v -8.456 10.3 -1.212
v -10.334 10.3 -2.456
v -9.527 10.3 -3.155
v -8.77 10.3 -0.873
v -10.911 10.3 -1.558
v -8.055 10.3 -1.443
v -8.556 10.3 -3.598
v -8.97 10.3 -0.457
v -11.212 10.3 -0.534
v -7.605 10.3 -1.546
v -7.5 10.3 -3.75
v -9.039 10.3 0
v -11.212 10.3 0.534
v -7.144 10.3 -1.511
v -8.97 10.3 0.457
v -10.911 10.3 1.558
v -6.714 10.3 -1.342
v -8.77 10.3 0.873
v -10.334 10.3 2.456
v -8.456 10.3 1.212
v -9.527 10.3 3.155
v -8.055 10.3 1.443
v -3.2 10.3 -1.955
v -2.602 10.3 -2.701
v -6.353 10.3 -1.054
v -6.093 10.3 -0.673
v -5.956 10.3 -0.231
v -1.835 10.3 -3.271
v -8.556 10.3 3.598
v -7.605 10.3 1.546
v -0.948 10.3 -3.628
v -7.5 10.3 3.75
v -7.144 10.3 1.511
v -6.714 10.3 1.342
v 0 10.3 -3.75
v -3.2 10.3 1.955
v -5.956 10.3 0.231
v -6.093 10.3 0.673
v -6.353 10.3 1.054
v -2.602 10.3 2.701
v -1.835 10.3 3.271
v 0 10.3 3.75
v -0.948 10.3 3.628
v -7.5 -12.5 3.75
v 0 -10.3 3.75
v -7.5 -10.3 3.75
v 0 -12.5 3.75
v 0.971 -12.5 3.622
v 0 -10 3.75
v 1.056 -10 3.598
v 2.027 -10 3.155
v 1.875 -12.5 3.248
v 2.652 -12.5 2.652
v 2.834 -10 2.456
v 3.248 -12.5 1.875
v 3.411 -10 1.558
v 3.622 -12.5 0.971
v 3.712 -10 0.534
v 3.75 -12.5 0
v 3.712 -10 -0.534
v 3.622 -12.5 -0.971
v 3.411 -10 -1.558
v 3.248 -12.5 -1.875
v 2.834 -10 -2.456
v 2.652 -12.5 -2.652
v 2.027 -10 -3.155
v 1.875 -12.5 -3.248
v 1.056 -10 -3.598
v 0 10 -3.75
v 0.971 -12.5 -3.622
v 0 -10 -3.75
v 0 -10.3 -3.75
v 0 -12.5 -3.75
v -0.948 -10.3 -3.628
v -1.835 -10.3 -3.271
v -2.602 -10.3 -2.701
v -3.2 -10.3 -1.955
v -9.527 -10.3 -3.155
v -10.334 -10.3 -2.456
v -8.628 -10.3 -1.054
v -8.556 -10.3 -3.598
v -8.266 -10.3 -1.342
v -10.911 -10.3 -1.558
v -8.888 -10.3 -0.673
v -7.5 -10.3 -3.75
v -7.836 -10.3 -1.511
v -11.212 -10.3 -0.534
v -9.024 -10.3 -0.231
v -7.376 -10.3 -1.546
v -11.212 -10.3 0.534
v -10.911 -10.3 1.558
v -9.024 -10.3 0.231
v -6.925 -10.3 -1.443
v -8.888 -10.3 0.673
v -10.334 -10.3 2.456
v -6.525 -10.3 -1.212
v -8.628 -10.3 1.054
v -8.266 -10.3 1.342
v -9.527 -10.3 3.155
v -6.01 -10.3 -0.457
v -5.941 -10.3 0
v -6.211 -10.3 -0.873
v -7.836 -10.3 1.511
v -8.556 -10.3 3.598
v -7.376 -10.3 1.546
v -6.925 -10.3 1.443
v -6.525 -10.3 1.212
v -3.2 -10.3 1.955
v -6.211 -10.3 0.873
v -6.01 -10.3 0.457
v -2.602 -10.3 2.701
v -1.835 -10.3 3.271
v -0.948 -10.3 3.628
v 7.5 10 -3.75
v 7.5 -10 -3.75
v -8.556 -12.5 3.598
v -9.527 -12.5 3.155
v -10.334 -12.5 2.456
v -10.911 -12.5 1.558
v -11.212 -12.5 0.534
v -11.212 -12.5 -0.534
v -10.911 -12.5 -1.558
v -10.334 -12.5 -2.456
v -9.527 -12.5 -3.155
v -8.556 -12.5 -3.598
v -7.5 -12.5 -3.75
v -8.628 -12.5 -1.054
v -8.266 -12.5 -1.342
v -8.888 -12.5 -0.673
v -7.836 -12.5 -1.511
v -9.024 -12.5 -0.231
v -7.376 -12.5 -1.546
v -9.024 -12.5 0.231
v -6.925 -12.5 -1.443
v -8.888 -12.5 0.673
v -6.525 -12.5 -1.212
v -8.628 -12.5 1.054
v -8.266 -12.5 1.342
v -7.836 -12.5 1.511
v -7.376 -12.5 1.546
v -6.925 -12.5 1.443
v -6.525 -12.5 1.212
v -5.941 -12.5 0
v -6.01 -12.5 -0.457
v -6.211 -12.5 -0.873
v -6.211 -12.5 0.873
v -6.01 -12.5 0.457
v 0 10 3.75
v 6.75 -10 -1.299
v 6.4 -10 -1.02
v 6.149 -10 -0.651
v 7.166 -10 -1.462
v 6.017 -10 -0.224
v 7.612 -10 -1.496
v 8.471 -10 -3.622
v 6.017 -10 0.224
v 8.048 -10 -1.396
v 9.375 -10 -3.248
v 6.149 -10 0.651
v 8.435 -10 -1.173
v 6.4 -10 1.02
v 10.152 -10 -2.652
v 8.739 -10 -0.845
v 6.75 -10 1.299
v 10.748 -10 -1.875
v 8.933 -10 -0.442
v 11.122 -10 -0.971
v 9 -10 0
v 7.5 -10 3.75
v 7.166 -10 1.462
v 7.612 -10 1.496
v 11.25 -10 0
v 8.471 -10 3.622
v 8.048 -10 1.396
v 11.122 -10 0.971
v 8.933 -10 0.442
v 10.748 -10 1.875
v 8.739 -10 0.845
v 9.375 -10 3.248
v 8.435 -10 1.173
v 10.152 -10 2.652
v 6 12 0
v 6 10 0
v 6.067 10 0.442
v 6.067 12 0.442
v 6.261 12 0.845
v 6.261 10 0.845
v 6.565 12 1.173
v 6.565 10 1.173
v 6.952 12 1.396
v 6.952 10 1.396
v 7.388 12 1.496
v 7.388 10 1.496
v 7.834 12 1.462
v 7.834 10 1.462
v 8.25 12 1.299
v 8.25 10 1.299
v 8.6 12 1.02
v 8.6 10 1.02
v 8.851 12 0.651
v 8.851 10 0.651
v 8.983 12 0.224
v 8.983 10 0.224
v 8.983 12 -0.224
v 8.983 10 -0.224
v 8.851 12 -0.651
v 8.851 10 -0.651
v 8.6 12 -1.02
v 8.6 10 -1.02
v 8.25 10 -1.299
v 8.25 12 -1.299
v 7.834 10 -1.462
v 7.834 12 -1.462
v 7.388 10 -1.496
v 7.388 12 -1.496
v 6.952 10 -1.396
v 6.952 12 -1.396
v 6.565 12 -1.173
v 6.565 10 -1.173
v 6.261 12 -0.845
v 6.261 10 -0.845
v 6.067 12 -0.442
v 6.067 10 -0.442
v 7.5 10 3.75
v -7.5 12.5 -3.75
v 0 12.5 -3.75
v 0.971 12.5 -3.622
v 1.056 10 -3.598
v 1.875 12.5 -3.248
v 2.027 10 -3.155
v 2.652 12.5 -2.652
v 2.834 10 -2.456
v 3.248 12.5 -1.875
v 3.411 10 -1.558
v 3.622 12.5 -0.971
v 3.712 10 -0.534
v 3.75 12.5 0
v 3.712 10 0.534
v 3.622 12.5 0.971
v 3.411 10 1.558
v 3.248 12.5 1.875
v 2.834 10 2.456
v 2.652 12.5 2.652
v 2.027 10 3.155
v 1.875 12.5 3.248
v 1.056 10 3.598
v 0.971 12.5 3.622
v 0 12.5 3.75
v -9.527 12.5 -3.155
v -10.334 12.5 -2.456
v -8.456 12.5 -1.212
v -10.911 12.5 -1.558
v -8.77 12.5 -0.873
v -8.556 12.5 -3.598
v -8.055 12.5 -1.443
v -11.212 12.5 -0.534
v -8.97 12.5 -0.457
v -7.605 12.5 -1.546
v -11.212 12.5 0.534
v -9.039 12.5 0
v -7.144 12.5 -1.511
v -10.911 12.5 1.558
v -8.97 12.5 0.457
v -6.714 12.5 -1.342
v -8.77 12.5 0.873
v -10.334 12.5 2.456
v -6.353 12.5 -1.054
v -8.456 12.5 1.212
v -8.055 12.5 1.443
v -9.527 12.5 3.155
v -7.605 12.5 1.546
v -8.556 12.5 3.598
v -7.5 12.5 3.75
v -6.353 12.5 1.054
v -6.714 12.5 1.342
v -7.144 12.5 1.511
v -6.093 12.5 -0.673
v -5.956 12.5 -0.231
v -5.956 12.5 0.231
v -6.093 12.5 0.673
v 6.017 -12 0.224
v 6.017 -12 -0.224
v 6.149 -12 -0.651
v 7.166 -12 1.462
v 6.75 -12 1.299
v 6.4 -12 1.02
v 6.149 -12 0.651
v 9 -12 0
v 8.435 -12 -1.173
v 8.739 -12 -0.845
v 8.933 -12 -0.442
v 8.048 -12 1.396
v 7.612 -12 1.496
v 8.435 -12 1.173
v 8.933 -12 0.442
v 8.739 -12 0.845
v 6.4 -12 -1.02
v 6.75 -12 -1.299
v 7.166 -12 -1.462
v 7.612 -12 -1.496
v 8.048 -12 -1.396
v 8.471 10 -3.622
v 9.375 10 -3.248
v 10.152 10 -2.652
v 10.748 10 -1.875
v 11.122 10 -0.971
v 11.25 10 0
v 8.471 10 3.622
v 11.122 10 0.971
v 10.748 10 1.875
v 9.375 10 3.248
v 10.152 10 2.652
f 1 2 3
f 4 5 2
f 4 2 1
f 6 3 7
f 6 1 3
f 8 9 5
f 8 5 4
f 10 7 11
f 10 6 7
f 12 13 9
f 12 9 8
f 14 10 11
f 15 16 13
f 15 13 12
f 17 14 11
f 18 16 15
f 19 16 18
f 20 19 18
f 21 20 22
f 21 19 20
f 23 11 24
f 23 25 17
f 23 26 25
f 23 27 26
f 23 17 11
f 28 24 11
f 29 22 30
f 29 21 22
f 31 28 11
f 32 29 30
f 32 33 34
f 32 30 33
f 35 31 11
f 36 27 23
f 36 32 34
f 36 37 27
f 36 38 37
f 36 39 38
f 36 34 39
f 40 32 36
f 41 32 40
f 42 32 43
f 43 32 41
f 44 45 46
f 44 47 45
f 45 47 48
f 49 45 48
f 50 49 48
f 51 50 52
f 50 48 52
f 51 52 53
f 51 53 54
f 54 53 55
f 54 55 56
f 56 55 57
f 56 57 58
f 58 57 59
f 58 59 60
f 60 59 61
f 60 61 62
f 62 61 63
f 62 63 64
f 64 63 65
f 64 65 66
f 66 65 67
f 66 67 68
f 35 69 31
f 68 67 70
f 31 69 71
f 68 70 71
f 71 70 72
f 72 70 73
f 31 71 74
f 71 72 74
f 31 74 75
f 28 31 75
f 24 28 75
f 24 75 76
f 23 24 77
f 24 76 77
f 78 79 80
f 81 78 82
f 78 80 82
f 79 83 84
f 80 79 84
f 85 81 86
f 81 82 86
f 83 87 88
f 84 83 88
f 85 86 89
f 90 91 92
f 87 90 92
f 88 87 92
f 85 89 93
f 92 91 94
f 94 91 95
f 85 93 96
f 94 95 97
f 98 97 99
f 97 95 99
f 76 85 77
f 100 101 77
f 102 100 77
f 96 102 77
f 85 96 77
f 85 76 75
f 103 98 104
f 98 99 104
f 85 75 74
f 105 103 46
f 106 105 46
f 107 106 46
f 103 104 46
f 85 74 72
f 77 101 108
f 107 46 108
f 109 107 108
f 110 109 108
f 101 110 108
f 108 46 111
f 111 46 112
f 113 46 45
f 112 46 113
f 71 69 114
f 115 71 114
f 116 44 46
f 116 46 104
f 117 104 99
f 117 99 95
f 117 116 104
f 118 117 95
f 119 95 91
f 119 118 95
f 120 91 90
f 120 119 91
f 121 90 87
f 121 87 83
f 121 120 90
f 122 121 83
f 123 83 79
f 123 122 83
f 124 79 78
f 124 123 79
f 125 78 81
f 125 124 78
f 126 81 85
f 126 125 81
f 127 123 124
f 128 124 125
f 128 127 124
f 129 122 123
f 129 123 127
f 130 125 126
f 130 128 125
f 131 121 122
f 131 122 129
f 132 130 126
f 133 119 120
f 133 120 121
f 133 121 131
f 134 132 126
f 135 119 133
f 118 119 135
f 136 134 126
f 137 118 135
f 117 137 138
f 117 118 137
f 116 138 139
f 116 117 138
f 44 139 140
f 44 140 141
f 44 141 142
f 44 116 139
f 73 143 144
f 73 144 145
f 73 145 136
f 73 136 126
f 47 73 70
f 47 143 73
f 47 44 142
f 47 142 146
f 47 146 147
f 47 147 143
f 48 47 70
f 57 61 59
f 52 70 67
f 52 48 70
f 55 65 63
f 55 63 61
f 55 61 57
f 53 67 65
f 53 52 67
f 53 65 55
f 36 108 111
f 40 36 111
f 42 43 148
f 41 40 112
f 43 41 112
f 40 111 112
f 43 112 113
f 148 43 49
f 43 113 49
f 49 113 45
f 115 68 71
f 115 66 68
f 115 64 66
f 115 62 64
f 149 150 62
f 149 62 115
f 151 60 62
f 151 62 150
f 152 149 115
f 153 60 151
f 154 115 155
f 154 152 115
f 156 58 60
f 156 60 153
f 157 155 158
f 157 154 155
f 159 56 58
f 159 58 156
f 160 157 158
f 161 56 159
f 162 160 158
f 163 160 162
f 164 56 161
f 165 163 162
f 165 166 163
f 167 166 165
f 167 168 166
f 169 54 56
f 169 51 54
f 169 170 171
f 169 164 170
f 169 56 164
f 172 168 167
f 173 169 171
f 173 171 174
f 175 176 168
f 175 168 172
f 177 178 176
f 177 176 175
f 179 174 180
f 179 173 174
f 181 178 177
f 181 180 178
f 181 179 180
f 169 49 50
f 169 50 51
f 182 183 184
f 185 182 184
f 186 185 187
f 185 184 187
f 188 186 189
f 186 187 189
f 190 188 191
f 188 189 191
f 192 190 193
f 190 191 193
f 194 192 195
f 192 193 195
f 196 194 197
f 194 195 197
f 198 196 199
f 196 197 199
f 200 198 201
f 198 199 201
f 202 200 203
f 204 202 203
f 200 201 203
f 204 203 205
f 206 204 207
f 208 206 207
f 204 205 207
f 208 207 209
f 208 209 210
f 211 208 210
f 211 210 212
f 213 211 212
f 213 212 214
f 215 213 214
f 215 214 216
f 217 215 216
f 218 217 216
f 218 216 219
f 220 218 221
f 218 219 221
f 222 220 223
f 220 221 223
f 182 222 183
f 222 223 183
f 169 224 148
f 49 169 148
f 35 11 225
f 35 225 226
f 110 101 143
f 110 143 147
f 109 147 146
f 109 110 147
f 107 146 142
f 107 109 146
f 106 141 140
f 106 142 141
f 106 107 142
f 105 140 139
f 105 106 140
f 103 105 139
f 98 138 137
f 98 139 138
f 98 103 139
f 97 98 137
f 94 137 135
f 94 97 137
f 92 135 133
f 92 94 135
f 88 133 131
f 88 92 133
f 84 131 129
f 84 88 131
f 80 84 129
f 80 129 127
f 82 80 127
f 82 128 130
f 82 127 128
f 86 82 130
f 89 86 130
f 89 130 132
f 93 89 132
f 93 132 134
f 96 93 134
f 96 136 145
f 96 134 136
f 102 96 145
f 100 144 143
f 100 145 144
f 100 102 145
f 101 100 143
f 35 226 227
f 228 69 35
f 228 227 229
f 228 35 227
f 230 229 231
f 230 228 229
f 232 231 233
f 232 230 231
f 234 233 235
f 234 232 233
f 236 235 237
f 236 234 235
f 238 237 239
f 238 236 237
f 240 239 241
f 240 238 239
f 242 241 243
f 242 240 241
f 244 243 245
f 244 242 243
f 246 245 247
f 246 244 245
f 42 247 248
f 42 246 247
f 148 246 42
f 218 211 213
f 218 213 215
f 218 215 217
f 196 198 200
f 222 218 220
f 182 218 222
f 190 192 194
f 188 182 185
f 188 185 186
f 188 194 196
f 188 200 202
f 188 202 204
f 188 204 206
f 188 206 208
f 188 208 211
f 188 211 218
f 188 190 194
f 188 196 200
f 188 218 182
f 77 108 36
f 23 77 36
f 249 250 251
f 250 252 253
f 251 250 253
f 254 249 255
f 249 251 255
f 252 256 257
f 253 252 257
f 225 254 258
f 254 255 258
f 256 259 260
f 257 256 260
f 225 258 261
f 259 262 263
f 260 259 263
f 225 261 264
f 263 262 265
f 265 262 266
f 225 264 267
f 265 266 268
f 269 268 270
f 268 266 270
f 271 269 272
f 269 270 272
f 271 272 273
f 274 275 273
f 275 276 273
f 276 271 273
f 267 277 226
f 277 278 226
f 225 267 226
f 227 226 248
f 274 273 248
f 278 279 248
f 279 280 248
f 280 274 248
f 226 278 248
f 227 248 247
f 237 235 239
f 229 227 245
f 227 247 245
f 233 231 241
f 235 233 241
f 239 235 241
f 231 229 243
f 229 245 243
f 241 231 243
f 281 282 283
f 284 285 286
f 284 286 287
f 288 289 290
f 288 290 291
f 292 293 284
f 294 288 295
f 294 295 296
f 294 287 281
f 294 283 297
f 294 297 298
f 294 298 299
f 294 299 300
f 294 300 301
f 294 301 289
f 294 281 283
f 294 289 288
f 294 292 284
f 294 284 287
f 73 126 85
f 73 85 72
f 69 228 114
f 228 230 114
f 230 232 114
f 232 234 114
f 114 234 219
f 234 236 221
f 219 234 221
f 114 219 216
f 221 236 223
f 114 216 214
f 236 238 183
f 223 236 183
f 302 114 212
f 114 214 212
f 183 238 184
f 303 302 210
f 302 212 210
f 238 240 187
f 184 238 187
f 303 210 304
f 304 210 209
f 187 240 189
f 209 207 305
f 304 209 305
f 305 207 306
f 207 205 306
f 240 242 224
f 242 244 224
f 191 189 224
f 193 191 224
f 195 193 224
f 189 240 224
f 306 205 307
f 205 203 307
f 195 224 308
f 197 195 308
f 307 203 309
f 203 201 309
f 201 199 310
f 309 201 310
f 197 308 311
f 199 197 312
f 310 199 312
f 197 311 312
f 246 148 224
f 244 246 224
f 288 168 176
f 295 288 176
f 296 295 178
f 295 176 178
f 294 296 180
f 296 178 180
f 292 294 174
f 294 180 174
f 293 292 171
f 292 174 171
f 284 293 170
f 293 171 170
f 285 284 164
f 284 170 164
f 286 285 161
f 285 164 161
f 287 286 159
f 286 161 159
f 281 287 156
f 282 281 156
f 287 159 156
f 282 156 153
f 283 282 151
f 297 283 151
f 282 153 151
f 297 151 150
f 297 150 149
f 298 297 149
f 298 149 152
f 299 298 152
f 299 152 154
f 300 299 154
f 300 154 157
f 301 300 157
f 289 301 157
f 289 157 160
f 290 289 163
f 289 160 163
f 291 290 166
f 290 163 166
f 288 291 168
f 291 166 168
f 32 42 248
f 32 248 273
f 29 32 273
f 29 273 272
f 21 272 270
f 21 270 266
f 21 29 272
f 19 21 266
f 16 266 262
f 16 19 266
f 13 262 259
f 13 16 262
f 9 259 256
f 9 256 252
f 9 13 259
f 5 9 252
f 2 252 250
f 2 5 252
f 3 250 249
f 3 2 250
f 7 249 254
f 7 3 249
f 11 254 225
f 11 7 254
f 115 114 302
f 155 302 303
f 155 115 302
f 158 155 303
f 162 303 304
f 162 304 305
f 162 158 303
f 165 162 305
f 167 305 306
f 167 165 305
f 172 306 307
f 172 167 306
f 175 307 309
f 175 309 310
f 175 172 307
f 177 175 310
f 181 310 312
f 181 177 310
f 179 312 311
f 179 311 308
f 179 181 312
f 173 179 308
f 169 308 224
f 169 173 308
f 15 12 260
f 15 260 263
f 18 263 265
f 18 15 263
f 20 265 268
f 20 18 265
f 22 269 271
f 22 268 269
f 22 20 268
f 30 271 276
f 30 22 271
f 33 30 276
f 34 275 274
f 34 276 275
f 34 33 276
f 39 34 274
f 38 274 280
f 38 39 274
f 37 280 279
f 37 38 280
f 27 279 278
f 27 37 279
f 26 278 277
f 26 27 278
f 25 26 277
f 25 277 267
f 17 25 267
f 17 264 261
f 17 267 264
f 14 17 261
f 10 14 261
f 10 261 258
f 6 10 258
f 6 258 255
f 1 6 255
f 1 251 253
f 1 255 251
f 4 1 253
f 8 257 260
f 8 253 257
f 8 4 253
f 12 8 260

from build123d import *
from build123d import SkipClean  # not in build123d's __all__

# Parameters (mm, degrees)
F1_DEPTH  = 10
F2_DEPTH  = 12.5
F3_DEPTH  = 10.3
F4_R      = 1.5
F5_DEPTH  = 2
F4_R_2    = 1.55
F6_DEPTH  = 5
F7_R      = 1.5
F8_DEPTH  = 2
F7_R_2    = 1.55
F9_DEPTH  = 5
F11_DEPTH = 12.5


with BuildPart() as f1:
    # F0 (on Front) → F1 (new body, symmetric)
    with BuildSketch(Plane.XZ):
        with BuildLine():
            ThreePointArc((0, -3.75), (2.6516504294, -2.6516504294), (3.75, 0))
            ThreePointArc((3.75, 0), (2.6516504294, 2.6516504294), (0, 3.75))
            ThreePointArc((0, 3.75), (-2.6516504294, 2.6516504294), (-3.75, 0))
            ThreePointArc((-3.75, 0), (-2.6516504294, -2.6516504294), (0, -3.75))
        make_face()
        with BuildLine():
            ThreePointArc((0, 3.75), (2.6516504294, 2.6516504294), (3.75, 0))
            ThreePointArc((3.75, 0), (4.8483495706, 2.6516504294), (7.5, 3.75))
            Line((7.5, 3.75), (0, 3.75))
        make_face()
        with BuildLine():
            ThreePointArc((7.5, 3.75), (4.8483495706, 2.6516504294), (3.75, 0))
            ThreePointArc((3.75, 0), (4.8483495706, -2.6516504294), (7.5, -3.75))
            ThreePointArc((7.5, -3.75), (10.1516504294, -2.6516504294), (11.25, 0))
            ThreePointArc((11.25, 0), (10.1516504294, 2.6516504294), (7.5, 3.75))
        make_face()
        with BuildLine():
            ThreePointArc((7.5, -3.75), (4.8483495706, -2.6516504294), (3.75, 0))
            ThreePointArc((3.75, 0), (2.6516504294, -2.6516504294), (0, -3.75))
            Line((0, -3.75), (7.5, -3.75))
        make_face()
    extrude(amount=F1_DEPTH, both=True)

    # F0 (on Front) → F2 (join, symmetric)
    with BuildSketch(Plane.XZ):
        with BuildLine():
            ThreePointArc((-7.5, -3.75), (-4.8483495706, -2.6516504294), (-3.75, 0))
            ThreePointArc((-3.75, 0), (-4.8483495706, 2.6516504294), (-7.5, 3.75))
            ThreePointArc((-7.5, 3.75), (-11.25, 0), (-7.5, -3.75))
        make_face()
        with BuildLine():
            ThreePointArc((-3.75, 0), (-2.6516504294, 2.6516504294), (0, 3.75))
            Line((0, 3.75), (-7.5, 3.75))
            ThreePointArc((-7.5, 3.75), (-4.8483495706, 2.6516504294), (-3.75, 0))
        make_face()
        with BuildLine():
            ThreePointArc((0, -3.75), (2.6516504294, -2.6516504294), (3.75, 0))
            ThreePointArc((3.75, 0), (2.6516504294, 2.6516504294), (0, 3.75))
            ThreePointArc((0, 3.75), (-2.6516504294, 2.6516504294), (-3.75, 0))
            ThreePointArc((-3.75, 0), (-2.6516504294, -2.6516504294), (0, -3.75))
        make_face()
        with BuildLine():
            Line((-7.5, -3.75), (0, -3.75))
            ThreePointArc((0, -3.75), (-2.6516504294, -2.6516504294), (-3.75, 0))
            ThreePointArc((-3.75, 0), (-4.8483495706, -2.6516504294), (-7.5, -3.75))
        make_face()
    extrude(amount=F2_DEPTH, both=True)

    # F0 (on Front) → F3 (cut, symmetric)
    with BuildSketch(Plane.XZ):
        with BuildLine():
            ThreePointArc((-7.5, -3.75), (-4.8483495706, -2.6516504294), (-3.75, 0))
            ThreePointArc((-3.75, 0), (-4.8483495706, 2.6516504294), (-7.5, 3.75))
            ThreePointArc((-7.5, 3.75), (-11.25, 0), (-7.5, -3.75))
        make_face()
        with BuildLine():
            Line((-7.5, -3.75), (0, -3.75))
            ThreePointArc((0, -3.75), (-2.6516504294, -2.6516504294), (-3.75, 0))
            ThreePointArc((-3.75, 0), (-4.8483495706, -2.6516504294), (-7.5, -3.75))
        make_face()
        with BuildLine():
            ThreePointArc((-3.75, 0), (-2.6516504294, 2.6516504294), (0, 3.75))
            Line((0, 3.75), (-7.5, 3.75))
            ThreePointArc((-7.5, 3.75), (-4.8483495706, 2.6516504294), (-3.75, 0))
        make_face()
    with SkipClean():  # cleaning this boolean's faces spoils the solid; the shape is the same uncleaned
        extrude(amount=F3_DEPTH, both=True, mode=Mode.SUBTRACT)

    # F4 (on face) → F5 (join)
    with BuildSketch(Plane.XZ.offset(10)):
        with Locations((7.5, 0)):
            Circle(F4_R)
    extrude(amount=F5_DEPTH)

    # F4 (on face) → F6 (cut)
    with BuildSketch(Plane.XZ.offset(10)):
        with Locations((-7.4913557619, 0)):
            Circle(F4_R_2)
    extrude(amount=F6_DEPTH, mode=Mode.SUBTRACT)

    # F7 (on face) → F8 (join)
    with BuildSketch(Plane(origin=(0, 10, 0), x_dir=(-1, 0, 0), z_dir=(0, 1, 0))):
        with Locations((-7.5, 0)):
            Circle(F7_R)
    extrude(amount=F8_DEPTH)

    # F7 (on face) → F9 (cut)
    with BuildSketch(Plane(origin=(0, 10, 0), x_dir=(-1, 0, 0), z_dir=(0, 1, 0))):
        with Locations((7.4891448021, 0)):
            Circle(F7_R_2)
    extrude(amount=F9_DEPTH, mode=Mode.SUBTRACT)

    # F10 (on Top) → F11 (cut, symmetric)
    with BuildSketch(Plane.XY):
        Polygon((-3.2, -10.3), (-3.2, 0), (-3.2, 10.3), (-14.7820527132, 10.3), (-14.7820527132, -10.3), align=None)
    extrude(amount=F11_DEPTH, both=True, mode=Mode.SUBTRACT)


solid = f1.part
